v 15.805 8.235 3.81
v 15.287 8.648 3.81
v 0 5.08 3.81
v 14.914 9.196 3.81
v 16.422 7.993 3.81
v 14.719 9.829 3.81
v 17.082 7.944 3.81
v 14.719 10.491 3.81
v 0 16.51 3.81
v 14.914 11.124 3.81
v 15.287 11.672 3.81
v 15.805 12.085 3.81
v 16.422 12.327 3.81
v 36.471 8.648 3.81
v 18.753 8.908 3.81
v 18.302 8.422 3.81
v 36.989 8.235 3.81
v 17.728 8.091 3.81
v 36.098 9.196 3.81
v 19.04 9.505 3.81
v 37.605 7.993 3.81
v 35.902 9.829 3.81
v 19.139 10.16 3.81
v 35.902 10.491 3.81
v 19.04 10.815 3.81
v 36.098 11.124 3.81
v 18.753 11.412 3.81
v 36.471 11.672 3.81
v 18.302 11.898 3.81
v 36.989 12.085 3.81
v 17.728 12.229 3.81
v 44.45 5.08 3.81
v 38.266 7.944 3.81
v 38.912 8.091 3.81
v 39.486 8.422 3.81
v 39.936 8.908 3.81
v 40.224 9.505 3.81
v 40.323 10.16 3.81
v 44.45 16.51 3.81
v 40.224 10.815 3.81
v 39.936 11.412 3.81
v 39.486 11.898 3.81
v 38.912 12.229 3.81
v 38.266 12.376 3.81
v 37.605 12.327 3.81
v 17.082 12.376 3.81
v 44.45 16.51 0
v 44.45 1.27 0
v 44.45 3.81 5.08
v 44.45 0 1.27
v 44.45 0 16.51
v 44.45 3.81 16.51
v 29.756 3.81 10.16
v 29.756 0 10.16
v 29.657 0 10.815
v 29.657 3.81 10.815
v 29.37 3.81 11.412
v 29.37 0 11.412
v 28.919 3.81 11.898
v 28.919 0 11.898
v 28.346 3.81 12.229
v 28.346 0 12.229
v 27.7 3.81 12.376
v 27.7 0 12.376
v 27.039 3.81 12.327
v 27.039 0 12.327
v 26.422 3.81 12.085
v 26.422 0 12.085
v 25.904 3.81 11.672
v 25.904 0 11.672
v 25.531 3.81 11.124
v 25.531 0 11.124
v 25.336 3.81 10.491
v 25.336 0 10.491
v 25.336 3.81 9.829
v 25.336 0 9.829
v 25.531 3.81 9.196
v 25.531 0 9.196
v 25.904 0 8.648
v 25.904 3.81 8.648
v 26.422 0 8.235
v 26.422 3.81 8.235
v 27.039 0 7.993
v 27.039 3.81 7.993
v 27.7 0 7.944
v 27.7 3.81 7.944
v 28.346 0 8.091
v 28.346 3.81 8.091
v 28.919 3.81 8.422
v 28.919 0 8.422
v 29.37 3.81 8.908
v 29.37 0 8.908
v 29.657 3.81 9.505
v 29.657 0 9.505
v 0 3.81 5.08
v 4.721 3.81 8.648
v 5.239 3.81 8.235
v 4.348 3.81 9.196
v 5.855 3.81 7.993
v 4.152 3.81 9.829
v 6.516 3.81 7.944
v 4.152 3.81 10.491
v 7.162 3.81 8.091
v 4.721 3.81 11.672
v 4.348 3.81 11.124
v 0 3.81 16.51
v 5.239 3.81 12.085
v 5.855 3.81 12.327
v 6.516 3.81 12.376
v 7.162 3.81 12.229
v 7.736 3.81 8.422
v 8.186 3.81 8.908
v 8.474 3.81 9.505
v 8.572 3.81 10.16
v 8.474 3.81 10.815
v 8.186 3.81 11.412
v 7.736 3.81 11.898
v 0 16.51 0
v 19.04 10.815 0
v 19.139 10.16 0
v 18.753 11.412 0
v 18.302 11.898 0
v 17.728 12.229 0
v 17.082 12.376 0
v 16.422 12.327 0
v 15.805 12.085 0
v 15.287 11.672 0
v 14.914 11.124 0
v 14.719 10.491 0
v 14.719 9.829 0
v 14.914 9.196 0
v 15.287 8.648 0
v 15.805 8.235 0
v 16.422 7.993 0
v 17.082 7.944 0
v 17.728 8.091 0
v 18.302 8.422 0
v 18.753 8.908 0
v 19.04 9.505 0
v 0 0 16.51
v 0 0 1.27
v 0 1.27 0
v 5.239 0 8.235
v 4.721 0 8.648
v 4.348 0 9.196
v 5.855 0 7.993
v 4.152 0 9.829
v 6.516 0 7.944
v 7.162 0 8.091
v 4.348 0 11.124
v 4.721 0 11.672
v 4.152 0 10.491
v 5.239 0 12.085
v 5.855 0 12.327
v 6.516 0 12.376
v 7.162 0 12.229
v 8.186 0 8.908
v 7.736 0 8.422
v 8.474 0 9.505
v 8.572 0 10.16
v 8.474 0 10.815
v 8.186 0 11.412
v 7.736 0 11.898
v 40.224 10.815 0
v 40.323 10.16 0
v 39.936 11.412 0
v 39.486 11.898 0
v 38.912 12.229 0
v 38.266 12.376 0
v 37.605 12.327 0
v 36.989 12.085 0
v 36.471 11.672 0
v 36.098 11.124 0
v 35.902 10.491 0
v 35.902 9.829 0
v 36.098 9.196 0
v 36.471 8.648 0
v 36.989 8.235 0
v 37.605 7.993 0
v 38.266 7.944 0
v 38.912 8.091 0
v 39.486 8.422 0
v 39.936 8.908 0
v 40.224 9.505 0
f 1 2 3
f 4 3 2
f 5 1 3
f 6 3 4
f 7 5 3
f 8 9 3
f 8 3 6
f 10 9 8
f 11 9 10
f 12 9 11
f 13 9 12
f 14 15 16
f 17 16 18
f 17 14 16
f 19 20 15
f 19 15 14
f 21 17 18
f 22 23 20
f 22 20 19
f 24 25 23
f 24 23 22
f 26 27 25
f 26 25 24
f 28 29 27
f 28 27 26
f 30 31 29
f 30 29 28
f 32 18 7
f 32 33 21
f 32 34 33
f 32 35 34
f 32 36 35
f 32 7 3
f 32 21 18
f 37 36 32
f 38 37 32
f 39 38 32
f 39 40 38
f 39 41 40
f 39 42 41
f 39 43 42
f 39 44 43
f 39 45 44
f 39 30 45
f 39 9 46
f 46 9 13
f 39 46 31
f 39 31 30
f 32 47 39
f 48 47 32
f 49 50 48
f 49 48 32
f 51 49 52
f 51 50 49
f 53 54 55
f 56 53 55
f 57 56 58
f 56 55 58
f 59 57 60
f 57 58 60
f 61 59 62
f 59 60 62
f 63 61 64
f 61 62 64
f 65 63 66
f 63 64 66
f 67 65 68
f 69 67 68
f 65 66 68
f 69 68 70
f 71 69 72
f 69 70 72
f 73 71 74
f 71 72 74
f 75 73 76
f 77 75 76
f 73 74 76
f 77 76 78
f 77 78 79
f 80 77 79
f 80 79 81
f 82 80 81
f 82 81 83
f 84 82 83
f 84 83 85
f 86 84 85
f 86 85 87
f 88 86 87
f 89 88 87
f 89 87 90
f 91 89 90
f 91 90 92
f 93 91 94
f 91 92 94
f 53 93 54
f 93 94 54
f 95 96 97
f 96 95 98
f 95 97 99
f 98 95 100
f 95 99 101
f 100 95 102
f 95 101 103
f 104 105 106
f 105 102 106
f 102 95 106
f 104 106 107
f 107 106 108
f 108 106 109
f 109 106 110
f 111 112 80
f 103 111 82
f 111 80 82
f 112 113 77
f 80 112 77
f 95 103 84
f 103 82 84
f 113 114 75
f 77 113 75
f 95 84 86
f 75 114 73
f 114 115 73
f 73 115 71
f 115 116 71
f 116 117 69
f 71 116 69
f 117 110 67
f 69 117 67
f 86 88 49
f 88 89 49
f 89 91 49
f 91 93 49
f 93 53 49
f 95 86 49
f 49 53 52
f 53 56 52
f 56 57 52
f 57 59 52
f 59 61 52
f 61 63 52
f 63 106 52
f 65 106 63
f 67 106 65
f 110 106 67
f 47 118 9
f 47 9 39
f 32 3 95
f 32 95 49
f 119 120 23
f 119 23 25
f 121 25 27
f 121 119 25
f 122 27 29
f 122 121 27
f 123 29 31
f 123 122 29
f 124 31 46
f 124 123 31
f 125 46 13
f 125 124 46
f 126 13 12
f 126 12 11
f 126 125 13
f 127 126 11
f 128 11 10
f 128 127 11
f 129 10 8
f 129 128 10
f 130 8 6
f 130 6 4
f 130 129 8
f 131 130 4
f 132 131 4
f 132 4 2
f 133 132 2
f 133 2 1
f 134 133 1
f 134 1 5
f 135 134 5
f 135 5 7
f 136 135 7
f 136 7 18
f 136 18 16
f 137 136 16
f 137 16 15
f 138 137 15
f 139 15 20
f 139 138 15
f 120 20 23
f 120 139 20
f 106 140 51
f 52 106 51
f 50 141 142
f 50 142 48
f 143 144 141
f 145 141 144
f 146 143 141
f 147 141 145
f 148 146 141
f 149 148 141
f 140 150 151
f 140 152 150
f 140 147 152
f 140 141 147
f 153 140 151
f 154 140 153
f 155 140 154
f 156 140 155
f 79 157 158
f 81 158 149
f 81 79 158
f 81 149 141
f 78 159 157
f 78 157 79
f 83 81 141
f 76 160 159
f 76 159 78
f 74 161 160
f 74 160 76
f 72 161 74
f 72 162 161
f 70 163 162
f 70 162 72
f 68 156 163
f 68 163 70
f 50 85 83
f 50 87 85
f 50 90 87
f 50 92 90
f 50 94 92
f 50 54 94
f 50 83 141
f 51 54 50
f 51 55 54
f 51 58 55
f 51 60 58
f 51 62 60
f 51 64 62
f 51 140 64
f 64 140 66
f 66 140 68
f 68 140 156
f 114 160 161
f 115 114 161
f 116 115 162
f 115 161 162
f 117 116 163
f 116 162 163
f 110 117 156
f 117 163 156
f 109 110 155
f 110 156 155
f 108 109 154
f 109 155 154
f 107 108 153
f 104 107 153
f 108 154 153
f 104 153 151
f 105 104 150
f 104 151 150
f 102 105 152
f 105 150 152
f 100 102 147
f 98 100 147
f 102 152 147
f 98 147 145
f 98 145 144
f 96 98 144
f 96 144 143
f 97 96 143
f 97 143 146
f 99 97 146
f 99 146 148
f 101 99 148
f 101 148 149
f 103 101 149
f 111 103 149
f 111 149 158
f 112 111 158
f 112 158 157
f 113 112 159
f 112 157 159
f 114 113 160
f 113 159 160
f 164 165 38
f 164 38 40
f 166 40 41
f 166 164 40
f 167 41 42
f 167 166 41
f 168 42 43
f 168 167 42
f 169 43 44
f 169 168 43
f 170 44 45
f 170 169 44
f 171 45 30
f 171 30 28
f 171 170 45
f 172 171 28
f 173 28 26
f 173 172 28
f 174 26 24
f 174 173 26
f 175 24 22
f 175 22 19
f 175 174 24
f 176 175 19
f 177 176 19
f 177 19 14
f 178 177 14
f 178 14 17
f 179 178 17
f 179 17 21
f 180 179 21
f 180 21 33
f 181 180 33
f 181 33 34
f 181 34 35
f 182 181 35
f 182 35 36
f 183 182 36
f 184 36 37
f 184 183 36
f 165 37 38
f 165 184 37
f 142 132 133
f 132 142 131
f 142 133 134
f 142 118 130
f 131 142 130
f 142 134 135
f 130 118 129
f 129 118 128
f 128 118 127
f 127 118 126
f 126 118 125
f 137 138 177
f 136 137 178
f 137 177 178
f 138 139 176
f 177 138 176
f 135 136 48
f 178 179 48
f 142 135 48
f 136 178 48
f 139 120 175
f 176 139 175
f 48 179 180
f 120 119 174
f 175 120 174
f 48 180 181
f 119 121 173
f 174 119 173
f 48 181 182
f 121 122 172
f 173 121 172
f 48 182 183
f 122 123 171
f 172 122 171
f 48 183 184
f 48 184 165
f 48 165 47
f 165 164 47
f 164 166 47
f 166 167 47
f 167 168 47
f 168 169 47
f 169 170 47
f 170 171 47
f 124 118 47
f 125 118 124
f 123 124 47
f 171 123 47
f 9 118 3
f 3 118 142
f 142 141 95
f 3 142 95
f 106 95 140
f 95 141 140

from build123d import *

# Parameters (mm, degrees)
F0_W     = 44.45
F0_H     = 16.51
F0_R     = 2.2225
F1_DEPTH = 3.81
F2_W     = 44.45
F2_H     = 12.7
F2_R     = 2.2225
F3_DEPTH = 3.81
F4_SIZE  = 1.27
F5_SIZE  = 1.27


with BuildPart() as f1:
    # F0 (on Top) → F1 (new body)
    with BuildSketch(Plane.XY):
        with Locations((22.225, 8.255)):
            Rectangle(F0_W, F0_H)
        with Locations((16.9164, 10.16)):
            Circle(F0_R, mode=Mode.SUBTRACT)
        with Locations((38.1, 10.16)):
            Circle(F0_R, mode=Mode.SUBTRACT)
    extrude(amount=F1_DEPTH)

    # F2 (on face) → F3 (join)
    with BuildSketch(Plane.XZ):
        with Locations((22.225, 10.16)):
            Rectangle(F2_W, F2_H)
        with Locations((6.35, 10.16)):
            Circle(F2_R, mode=Mode.SUBTRACT)
        with Locations((27.5336, 10.16)):
            Circle(F2_R, mode=Mode.SUBTRACT)
    extrude(amount=-F3_DEPTH)

    # F4
    f4_edges = [f1.edges().sort_by_distance(p)[0] for p in [
        (22.225, 0, 0),
    ]]
    chamfer(f4_edges, length=F4_SIZE)

    # F5
    f5_edges = [f1.edges().sort_by_distance(p)[0] for p in [
        (22.225, 3.81, 3.81),
    ]]
    chamfer(f5_edges, length=F5_SIZE)


solid = f1.part
